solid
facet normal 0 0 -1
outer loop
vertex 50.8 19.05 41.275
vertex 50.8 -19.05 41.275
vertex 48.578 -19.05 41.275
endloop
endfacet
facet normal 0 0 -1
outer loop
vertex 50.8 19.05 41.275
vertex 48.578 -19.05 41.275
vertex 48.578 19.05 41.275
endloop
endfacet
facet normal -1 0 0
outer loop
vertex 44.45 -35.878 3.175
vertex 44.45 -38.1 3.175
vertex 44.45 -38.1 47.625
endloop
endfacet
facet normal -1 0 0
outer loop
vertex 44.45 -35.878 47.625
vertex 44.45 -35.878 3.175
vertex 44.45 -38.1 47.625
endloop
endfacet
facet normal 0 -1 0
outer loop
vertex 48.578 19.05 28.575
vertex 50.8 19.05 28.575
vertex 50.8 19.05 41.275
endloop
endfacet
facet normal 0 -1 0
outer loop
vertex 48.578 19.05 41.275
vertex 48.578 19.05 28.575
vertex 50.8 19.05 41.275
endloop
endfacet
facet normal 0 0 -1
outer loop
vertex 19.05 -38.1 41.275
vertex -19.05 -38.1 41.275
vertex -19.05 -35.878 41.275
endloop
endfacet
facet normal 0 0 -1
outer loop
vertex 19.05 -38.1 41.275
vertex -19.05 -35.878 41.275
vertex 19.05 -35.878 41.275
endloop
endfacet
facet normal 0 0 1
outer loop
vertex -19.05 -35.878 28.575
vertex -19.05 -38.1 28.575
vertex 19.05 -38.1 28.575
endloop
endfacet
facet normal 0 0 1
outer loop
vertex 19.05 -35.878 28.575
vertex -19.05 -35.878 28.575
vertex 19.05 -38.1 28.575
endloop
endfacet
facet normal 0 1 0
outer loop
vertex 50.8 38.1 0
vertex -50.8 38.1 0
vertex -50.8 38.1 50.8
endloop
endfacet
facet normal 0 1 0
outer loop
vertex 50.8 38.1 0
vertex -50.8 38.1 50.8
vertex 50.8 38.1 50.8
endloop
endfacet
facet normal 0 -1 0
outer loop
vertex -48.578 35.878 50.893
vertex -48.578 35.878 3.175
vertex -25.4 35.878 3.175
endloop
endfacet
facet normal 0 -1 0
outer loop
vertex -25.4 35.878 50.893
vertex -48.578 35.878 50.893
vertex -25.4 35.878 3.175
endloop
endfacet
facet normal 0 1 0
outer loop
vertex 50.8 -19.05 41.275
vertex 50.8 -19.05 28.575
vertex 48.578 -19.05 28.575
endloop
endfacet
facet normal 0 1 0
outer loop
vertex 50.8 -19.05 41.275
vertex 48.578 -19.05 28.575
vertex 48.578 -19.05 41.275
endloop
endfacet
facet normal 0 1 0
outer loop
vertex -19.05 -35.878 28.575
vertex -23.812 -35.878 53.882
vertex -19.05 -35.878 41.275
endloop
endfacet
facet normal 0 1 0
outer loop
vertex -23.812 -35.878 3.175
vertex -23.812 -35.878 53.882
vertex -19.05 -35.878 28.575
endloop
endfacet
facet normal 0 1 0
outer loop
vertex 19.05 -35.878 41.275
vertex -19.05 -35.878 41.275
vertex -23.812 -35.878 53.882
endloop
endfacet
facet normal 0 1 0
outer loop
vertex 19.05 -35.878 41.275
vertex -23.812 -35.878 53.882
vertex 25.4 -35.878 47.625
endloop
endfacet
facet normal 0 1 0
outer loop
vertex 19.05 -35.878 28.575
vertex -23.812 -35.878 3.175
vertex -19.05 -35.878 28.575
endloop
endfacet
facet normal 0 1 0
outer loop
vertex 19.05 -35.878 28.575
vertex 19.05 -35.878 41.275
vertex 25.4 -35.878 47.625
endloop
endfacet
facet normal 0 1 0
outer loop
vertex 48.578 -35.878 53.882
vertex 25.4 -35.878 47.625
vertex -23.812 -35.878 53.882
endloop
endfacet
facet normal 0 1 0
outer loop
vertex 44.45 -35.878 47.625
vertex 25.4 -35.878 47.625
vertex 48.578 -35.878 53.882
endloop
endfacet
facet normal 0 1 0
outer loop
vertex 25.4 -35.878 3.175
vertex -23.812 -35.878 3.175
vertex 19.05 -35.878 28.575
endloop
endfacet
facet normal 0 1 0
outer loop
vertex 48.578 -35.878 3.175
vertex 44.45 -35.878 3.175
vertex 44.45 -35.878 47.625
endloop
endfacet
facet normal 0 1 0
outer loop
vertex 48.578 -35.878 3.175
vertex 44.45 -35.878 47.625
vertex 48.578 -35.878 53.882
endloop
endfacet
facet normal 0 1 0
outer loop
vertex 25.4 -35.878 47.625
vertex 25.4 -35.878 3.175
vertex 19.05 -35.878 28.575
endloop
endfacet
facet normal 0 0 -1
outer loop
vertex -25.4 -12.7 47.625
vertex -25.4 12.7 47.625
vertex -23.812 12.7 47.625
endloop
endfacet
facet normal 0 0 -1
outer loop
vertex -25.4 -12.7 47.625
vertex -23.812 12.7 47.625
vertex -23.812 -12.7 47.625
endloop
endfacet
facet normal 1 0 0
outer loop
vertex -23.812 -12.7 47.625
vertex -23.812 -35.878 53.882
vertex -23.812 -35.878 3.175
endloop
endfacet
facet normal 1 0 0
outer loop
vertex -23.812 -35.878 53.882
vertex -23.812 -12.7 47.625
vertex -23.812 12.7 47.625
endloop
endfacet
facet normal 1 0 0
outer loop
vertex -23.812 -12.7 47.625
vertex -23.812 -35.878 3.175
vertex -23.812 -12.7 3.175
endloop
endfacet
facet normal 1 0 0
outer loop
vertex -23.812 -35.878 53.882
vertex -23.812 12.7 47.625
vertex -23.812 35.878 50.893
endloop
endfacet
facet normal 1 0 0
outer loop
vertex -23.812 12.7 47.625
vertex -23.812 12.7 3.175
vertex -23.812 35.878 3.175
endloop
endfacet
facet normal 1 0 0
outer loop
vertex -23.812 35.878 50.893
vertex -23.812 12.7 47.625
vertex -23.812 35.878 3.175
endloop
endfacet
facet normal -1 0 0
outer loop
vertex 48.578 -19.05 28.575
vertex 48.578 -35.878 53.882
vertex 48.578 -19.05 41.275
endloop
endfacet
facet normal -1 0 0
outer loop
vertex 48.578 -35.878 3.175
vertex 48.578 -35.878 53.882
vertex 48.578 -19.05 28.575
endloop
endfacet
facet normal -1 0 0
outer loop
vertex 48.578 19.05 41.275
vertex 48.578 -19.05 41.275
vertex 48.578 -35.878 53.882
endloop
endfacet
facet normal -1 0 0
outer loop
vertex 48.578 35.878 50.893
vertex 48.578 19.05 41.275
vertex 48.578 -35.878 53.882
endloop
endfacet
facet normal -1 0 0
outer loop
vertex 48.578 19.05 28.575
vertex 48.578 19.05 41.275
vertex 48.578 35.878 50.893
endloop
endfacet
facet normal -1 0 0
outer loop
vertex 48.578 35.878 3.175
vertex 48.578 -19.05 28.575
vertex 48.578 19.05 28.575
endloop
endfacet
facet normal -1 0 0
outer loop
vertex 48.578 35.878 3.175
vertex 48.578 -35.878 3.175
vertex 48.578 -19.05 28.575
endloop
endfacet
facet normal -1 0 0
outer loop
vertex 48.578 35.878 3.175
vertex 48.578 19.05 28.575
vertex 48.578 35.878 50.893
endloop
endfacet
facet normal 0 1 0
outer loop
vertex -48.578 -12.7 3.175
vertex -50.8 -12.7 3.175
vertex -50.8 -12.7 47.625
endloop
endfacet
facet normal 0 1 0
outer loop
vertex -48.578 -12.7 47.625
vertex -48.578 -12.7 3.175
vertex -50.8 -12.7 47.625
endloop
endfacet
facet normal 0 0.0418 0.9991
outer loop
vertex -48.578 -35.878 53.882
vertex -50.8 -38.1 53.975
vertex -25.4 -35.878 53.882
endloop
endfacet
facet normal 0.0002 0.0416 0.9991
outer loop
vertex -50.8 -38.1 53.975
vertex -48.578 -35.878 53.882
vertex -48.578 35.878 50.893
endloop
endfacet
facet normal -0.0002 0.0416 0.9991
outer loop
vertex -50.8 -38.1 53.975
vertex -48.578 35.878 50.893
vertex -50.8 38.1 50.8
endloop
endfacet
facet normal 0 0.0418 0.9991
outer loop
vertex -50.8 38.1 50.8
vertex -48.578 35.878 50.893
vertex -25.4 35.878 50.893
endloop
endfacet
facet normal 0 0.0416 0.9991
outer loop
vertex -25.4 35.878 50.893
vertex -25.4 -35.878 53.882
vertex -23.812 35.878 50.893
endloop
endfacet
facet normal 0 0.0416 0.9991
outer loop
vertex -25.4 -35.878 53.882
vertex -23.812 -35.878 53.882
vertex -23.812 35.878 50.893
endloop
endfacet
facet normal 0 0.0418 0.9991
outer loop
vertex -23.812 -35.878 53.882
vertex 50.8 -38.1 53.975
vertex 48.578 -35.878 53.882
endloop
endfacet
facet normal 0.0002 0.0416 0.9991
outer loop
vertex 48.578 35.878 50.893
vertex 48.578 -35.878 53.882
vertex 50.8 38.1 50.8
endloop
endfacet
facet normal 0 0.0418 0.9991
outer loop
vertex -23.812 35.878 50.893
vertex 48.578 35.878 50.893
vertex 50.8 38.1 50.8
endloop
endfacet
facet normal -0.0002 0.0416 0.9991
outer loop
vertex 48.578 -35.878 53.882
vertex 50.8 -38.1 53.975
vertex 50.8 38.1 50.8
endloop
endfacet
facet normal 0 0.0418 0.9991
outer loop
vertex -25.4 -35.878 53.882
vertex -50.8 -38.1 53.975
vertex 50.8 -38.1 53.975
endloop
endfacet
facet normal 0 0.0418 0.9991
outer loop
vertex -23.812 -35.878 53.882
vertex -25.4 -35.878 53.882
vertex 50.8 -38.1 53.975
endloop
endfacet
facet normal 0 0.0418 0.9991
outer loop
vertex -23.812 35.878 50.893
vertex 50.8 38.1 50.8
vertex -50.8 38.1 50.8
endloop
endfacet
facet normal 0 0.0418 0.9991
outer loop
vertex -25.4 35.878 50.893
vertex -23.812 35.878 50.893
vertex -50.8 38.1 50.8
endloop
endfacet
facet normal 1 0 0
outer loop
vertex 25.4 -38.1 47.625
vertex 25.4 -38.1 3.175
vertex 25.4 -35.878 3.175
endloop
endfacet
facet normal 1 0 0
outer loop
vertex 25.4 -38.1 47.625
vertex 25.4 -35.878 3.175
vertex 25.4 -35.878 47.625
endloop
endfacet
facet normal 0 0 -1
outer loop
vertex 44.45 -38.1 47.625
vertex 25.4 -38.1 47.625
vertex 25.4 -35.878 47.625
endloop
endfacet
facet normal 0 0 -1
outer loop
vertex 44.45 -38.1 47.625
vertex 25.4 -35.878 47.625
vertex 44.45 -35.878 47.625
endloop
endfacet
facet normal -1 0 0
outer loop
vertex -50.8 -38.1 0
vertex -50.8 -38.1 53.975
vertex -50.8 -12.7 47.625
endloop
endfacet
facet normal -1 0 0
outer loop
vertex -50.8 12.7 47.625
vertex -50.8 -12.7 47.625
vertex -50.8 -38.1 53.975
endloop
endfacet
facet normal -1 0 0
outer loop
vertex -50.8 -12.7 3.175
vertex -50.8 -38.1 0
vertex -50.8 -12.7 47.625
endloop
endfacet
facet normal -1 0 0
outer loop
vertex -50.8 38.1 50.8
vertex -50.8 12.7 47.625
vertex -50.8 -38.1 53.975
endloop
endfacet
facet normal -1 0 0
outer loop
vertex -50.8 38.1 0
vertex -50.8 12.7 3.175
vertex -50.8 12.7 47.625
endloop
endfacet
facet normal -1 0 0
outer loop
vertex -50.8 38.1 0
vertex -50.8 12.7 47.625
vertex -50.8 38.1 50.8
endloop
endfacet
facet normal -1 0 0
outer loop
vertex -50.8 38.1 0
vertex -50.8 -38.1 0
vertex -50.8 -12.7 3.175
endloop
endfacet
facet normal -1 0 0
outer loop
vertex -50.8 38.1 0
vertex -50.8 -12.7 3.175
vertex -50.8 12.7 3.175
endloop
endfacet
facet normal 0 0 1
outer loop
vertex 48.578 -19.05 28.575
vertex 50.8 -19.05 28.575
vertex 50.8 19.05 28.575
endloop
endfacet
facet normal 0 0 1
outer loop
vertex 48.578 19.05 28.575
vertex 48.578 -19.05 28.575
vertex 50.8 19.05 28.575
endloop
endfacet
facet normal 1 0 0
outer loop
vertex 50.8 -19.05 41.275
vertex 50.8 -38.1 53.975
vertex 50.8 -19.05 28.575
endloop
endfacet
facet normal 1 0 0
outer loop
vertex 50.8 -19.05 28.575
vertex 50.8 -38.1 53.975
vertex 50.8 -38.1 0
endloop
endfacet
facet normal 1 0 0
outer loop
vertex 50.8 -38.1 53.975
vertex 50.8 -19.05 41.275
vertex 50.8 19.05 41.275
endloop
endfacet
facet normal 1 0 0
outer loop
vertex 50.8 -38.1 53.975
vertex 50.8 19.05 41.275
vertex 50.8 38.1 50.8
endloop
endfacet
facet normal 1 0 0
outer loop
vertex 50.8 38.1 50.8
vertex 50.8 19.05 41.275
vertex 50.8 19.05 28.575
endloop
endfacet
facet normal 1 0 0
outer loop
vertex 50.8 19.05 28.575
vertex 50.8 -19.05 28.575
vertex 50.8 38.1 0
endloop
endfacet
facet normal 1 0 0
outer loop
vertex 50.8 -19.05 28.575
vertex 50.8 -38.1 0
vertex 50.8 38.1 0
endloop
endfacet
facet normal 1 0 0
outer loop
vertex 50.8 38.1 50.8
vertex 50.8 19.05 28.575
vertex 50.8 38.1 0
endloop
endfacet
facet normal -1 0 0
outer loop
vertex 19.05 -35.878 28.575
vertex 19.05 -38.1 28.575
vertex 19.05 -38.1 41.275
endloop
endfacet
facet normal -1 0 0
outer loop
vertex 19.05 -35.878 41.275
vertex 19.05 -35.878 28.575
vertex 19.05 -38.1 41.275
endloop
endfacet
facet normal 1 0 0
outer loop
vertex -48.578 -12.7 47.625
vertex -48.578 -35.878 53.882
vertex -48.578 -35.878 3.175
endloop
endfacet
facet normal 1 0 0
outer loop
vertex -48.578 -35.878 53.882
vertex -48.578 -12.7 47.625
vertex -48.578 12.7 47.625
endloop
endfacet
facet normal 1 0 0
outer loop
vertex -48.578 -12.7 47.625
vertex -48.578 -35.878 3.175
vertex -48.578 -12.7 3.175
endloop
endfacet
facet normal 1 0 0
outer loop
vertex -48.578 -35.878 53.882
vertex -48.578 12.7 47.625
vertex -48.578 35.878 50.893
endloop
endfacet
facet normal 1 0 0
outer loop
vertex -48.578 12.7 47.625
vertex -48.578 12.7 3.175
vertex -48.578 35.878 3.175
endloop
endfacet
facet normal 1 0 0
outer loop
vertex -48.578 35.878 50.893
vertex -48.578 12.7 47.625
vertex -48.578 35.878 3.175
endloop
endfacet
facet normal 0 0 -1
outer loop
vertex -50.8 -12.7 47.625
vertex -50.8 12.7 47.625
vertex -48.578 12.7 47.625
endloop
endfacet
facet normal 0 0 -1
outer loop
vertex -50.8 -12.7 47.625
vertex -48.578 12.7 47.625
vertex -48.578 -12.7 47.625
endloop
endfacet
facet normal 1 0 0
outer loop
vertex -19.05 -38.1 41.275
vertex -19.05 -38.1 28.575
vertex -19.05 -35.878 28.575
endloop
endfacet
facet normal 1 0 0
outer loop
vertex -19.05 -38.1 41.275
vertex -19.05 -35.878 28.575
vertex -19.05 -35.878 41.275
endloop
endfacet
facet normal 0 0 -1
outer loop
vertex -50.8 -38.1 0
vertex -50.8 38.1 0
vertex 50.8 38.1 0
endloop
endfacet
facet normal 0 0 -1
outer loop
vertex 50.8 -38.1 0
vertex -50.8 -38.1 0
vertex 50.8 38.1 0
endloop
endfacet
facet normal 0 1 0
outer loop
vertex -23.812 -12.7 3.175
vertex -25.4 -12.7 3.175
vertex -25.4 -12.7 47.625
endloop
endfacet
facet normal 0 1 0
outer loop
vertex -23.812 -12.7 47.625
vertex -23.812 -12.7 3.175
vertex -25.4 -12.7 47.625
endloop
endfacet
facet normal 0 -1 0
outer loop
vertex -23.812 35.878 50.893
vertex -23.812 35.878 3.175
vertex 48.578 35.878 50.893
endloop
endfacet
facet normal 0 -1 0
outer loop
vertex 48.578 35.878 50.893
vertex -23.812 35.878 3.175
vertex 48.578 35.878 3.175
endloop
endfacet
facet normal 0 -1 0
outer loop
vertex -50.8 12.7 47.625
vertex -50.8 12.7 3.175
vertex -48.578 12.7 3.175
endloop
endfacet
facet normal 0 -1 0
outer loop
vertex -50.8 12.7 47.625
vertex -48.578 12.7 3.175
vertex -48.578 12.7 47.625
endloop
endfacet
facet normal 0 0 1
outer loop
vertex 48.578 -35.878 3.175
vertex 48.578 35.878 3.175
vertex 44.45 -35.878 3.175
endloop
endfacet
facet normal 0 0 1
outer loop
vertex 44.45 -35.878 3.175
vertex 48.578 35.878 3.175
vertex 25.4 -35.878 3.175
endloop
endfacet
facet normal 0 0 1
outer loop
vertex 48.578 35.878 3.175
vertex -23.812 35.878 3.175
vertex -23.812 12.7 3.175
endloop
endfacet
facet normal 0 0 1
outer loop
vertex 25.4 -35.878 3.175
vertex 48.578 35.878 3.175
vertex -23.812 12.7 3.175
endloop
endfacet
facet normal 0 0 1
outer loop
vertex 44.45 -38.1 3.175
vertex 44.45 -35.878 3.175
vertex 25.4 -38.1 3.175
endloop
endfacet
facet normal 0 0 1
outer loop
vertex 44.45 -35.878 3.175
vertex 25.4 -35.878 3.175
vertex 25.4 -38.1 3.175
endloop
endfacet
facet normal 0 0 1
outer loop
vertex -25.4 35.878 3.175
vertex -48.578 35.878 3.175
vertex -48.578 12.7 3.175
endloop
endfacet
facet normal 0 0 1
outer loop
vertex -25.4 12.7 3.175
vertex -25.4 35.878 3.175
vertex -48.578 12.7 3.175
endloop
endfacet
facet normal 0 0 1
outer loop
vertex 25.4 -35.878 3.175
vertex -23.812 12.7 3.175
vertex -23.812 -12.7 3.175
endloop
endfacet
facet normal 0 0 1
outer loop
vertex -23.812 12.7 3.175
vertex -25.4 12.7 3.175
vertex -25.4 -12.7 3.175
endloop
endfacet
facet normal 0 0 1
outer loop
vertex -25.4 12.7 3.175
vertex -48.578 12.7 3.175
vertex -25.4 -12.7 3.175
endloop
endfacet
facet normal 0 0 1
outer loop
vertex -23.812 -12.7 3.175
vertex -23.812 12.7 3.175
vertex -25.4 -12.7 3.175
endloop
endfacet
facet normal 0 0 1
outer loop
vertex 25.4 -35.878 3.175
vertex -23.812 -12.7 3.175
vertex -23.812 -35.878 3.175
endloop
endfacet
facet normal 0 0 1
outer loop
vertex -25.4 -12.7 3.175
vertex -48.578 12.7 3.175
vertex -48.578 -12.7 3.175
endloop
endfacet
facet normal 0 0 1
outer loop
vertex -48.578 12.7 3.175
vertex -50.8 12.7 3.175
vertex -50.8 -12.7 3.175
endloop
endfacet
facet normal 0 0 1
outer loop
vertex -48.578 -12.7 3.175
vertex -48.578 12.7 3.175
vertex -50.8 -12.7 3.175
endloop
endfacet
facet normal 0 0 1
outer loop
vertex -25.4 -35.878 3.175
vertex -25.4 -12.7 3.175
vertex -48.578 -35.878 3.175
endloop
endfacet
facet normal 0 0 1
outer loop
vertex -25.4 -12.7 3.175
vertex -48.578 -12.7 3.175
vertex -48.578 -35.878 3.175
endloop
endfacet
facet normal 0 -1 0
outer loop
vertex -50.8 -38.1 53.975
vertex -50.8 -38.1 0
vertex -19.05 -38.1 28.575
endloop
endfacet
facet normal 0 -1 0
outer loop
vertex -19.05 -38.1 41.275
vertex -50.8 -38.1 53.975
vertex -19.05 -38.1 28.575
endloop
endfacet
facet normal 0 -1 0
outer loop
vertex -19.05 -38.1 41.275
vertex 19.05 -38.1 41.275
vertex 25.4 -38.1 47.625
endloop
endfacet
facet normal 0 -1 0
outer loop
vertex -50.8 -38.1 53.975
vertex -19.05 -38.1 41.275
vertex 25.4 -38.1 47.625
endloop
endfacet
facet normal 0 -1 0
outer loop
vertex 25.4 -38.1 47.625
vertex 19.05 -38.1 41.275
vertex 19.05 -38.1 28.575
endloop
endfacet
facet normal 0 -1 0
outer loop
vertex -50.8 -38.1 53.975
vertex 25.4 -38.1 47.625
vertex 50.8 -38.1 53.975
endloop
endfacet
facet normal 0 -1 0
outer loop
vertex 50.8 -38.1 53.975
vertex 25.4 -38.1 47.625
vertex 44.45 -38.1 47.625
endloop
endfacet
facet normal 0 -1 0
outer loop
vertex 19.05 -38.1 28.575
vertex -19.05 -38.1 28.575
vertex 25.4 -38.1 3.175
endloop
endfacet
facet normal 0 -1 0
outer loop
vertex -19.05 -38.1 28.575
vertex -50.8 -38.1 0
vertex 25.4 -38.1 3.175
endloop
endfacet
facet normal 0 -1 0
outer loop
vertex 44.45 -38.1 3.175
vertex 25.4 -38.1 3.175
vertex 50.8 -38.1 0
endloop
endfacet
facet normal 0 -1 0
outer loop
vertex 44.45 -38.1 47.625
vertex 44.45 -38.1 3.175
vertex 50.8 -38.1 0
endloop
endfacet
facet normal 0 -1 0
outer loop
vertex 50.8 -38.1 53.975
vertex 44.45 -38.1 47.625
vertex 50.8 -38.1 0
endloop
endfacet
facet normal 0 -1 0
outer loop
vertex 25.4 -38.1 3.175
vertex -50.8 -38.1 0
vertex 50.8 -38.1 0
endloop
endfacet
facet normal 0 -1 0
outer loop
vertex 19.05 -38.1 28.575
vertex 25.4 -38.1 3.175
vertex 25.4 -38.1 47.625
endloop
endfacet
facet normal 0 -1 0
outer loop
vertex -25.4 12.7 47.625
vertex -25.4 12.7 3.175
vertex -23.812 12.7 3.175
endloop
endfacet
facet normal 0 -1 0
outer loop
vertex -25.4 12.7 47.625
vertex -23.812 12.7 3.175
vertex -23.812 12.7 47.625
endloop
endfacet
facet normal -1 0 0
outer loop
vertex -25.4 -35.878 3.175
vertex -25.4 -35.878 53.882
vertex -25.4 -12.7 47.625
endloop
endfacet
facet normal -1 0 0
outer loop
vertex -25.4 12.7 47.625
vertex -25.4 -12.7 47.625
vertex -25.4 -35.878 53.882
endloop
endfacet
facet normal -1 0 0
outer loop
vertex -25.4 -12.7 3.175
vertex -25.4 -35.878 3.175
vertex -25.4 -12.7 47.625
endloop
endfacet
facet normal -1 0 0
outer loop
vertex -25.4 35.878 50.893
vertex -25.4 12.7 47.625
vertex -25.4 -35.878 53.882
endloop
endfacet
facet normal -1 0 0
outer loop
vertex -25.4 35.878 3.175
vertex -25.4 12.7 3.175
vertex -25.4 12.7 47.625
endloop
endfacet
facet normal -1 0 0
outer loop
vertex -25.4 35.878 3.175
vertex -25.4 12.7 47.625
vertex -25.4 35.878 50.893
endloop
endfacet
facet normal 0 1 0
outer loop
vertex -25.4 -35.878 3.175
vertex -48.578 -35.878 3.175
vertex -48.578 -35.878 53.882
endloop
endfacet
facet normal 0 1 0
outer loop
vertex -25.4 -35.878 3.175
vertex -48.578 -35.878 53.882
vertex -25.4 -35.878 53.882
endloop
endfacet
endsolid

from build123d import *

# Parameters (mm, degrees)
F0_W      = 101.6
F0_H      = 76.2
F1_DEPTH  = 3.175
F2_W      = 101.6
F2_H      = 76.2
F2_W_2    = 97.155
F2_H_2    = 71.755
F3_DEPTH  = 50.8
F4_W      = 1.5875
F4_H      = 71.755
F5_DEPTH  = 50.8
F6_W      = 19.05
F6_H      = 44.45
F6_W_2    = 38.1
F6_H_2    = 12.7
F7_DEPTH  = 25.4
F8_W      = 38.1
F8_H      = 12.7
F9_DEPTH  = 25.4
F11_DEPTH = 101.6
F12_W     = 25.4
F12_H     = 44.45
F13_DEPTH = 76.2


with BuildPart() as f1:
    # F0 (on Top) → F1 (new body)
    with BuildSketch(Plane.XY):
        Rectangle(F0_W, F0_H)
    extrude(amount=F1_DEPTH)

    # F2 (on face) → F3 (join)
    with BuildSketch(Plane.XY.offset(3.175)):
        Rectangle(F2_W, F2_H)
        Rectangle(F2_W_2, F2_H_2, mode=Mode.SUBTRACT)
    extrude(amount=F3_DEPTH)

    # F4 (on face) → F5 (join)
    with BuildSketch(Plane.XY.offset(3.175)):
        with Locations((-24.60625, 0)):
            Rectangle(F4_W, F4_H)
    extrude(amount=F5_DEPTH)

    # F6 (on face) → F7 (cut)
    with BuildSketch(Plane.XZ.offset(38.1)):
        with Locations((34.925, 25.4)):
            Rectangle(F6_W, F6_H)
        with Locations((0, 34.925)):
            Rectangle(F6_W_2, F6_H_2)
    extrude(amount=-F7_DEPTH, mode=Mode.SUBTRACT)

    # F8 (on face) → F9 (cut)
    with BuildSketch(Plane.YZ.offset(50.8)):
        with Locations((0, 34.925)):
            Rectangle(F8_W, F8_H)
    extrude(amount=-F9_DEPTH, mode=Mode.SUBTRACT)

    # F10 (on face) → F11 (cut, through all)
    with BuildSketch(Plane.YZ.offset(50.8)):
        Polygon((38.1, 53.975), (-38.1, 53.975), (38.1, 50.8), align=None)
    extrude(amount=-F11_DEPTH, mode=Mode.SUBTRACT)

    # F12 (on face) → F13 (cut)
    with BuildSketch(Plane(origin=(-50.8, 0, 0), x_dir=(0, -1, 0), z_dir=(-1, 0, 0))):
        with Locations((0, 25.4)):
            Rectangle(F12_W, F12_H)
    extrude(amount=-F13_DEPTH, mode=Mode.SUBTRACT)


solid = f1.part
